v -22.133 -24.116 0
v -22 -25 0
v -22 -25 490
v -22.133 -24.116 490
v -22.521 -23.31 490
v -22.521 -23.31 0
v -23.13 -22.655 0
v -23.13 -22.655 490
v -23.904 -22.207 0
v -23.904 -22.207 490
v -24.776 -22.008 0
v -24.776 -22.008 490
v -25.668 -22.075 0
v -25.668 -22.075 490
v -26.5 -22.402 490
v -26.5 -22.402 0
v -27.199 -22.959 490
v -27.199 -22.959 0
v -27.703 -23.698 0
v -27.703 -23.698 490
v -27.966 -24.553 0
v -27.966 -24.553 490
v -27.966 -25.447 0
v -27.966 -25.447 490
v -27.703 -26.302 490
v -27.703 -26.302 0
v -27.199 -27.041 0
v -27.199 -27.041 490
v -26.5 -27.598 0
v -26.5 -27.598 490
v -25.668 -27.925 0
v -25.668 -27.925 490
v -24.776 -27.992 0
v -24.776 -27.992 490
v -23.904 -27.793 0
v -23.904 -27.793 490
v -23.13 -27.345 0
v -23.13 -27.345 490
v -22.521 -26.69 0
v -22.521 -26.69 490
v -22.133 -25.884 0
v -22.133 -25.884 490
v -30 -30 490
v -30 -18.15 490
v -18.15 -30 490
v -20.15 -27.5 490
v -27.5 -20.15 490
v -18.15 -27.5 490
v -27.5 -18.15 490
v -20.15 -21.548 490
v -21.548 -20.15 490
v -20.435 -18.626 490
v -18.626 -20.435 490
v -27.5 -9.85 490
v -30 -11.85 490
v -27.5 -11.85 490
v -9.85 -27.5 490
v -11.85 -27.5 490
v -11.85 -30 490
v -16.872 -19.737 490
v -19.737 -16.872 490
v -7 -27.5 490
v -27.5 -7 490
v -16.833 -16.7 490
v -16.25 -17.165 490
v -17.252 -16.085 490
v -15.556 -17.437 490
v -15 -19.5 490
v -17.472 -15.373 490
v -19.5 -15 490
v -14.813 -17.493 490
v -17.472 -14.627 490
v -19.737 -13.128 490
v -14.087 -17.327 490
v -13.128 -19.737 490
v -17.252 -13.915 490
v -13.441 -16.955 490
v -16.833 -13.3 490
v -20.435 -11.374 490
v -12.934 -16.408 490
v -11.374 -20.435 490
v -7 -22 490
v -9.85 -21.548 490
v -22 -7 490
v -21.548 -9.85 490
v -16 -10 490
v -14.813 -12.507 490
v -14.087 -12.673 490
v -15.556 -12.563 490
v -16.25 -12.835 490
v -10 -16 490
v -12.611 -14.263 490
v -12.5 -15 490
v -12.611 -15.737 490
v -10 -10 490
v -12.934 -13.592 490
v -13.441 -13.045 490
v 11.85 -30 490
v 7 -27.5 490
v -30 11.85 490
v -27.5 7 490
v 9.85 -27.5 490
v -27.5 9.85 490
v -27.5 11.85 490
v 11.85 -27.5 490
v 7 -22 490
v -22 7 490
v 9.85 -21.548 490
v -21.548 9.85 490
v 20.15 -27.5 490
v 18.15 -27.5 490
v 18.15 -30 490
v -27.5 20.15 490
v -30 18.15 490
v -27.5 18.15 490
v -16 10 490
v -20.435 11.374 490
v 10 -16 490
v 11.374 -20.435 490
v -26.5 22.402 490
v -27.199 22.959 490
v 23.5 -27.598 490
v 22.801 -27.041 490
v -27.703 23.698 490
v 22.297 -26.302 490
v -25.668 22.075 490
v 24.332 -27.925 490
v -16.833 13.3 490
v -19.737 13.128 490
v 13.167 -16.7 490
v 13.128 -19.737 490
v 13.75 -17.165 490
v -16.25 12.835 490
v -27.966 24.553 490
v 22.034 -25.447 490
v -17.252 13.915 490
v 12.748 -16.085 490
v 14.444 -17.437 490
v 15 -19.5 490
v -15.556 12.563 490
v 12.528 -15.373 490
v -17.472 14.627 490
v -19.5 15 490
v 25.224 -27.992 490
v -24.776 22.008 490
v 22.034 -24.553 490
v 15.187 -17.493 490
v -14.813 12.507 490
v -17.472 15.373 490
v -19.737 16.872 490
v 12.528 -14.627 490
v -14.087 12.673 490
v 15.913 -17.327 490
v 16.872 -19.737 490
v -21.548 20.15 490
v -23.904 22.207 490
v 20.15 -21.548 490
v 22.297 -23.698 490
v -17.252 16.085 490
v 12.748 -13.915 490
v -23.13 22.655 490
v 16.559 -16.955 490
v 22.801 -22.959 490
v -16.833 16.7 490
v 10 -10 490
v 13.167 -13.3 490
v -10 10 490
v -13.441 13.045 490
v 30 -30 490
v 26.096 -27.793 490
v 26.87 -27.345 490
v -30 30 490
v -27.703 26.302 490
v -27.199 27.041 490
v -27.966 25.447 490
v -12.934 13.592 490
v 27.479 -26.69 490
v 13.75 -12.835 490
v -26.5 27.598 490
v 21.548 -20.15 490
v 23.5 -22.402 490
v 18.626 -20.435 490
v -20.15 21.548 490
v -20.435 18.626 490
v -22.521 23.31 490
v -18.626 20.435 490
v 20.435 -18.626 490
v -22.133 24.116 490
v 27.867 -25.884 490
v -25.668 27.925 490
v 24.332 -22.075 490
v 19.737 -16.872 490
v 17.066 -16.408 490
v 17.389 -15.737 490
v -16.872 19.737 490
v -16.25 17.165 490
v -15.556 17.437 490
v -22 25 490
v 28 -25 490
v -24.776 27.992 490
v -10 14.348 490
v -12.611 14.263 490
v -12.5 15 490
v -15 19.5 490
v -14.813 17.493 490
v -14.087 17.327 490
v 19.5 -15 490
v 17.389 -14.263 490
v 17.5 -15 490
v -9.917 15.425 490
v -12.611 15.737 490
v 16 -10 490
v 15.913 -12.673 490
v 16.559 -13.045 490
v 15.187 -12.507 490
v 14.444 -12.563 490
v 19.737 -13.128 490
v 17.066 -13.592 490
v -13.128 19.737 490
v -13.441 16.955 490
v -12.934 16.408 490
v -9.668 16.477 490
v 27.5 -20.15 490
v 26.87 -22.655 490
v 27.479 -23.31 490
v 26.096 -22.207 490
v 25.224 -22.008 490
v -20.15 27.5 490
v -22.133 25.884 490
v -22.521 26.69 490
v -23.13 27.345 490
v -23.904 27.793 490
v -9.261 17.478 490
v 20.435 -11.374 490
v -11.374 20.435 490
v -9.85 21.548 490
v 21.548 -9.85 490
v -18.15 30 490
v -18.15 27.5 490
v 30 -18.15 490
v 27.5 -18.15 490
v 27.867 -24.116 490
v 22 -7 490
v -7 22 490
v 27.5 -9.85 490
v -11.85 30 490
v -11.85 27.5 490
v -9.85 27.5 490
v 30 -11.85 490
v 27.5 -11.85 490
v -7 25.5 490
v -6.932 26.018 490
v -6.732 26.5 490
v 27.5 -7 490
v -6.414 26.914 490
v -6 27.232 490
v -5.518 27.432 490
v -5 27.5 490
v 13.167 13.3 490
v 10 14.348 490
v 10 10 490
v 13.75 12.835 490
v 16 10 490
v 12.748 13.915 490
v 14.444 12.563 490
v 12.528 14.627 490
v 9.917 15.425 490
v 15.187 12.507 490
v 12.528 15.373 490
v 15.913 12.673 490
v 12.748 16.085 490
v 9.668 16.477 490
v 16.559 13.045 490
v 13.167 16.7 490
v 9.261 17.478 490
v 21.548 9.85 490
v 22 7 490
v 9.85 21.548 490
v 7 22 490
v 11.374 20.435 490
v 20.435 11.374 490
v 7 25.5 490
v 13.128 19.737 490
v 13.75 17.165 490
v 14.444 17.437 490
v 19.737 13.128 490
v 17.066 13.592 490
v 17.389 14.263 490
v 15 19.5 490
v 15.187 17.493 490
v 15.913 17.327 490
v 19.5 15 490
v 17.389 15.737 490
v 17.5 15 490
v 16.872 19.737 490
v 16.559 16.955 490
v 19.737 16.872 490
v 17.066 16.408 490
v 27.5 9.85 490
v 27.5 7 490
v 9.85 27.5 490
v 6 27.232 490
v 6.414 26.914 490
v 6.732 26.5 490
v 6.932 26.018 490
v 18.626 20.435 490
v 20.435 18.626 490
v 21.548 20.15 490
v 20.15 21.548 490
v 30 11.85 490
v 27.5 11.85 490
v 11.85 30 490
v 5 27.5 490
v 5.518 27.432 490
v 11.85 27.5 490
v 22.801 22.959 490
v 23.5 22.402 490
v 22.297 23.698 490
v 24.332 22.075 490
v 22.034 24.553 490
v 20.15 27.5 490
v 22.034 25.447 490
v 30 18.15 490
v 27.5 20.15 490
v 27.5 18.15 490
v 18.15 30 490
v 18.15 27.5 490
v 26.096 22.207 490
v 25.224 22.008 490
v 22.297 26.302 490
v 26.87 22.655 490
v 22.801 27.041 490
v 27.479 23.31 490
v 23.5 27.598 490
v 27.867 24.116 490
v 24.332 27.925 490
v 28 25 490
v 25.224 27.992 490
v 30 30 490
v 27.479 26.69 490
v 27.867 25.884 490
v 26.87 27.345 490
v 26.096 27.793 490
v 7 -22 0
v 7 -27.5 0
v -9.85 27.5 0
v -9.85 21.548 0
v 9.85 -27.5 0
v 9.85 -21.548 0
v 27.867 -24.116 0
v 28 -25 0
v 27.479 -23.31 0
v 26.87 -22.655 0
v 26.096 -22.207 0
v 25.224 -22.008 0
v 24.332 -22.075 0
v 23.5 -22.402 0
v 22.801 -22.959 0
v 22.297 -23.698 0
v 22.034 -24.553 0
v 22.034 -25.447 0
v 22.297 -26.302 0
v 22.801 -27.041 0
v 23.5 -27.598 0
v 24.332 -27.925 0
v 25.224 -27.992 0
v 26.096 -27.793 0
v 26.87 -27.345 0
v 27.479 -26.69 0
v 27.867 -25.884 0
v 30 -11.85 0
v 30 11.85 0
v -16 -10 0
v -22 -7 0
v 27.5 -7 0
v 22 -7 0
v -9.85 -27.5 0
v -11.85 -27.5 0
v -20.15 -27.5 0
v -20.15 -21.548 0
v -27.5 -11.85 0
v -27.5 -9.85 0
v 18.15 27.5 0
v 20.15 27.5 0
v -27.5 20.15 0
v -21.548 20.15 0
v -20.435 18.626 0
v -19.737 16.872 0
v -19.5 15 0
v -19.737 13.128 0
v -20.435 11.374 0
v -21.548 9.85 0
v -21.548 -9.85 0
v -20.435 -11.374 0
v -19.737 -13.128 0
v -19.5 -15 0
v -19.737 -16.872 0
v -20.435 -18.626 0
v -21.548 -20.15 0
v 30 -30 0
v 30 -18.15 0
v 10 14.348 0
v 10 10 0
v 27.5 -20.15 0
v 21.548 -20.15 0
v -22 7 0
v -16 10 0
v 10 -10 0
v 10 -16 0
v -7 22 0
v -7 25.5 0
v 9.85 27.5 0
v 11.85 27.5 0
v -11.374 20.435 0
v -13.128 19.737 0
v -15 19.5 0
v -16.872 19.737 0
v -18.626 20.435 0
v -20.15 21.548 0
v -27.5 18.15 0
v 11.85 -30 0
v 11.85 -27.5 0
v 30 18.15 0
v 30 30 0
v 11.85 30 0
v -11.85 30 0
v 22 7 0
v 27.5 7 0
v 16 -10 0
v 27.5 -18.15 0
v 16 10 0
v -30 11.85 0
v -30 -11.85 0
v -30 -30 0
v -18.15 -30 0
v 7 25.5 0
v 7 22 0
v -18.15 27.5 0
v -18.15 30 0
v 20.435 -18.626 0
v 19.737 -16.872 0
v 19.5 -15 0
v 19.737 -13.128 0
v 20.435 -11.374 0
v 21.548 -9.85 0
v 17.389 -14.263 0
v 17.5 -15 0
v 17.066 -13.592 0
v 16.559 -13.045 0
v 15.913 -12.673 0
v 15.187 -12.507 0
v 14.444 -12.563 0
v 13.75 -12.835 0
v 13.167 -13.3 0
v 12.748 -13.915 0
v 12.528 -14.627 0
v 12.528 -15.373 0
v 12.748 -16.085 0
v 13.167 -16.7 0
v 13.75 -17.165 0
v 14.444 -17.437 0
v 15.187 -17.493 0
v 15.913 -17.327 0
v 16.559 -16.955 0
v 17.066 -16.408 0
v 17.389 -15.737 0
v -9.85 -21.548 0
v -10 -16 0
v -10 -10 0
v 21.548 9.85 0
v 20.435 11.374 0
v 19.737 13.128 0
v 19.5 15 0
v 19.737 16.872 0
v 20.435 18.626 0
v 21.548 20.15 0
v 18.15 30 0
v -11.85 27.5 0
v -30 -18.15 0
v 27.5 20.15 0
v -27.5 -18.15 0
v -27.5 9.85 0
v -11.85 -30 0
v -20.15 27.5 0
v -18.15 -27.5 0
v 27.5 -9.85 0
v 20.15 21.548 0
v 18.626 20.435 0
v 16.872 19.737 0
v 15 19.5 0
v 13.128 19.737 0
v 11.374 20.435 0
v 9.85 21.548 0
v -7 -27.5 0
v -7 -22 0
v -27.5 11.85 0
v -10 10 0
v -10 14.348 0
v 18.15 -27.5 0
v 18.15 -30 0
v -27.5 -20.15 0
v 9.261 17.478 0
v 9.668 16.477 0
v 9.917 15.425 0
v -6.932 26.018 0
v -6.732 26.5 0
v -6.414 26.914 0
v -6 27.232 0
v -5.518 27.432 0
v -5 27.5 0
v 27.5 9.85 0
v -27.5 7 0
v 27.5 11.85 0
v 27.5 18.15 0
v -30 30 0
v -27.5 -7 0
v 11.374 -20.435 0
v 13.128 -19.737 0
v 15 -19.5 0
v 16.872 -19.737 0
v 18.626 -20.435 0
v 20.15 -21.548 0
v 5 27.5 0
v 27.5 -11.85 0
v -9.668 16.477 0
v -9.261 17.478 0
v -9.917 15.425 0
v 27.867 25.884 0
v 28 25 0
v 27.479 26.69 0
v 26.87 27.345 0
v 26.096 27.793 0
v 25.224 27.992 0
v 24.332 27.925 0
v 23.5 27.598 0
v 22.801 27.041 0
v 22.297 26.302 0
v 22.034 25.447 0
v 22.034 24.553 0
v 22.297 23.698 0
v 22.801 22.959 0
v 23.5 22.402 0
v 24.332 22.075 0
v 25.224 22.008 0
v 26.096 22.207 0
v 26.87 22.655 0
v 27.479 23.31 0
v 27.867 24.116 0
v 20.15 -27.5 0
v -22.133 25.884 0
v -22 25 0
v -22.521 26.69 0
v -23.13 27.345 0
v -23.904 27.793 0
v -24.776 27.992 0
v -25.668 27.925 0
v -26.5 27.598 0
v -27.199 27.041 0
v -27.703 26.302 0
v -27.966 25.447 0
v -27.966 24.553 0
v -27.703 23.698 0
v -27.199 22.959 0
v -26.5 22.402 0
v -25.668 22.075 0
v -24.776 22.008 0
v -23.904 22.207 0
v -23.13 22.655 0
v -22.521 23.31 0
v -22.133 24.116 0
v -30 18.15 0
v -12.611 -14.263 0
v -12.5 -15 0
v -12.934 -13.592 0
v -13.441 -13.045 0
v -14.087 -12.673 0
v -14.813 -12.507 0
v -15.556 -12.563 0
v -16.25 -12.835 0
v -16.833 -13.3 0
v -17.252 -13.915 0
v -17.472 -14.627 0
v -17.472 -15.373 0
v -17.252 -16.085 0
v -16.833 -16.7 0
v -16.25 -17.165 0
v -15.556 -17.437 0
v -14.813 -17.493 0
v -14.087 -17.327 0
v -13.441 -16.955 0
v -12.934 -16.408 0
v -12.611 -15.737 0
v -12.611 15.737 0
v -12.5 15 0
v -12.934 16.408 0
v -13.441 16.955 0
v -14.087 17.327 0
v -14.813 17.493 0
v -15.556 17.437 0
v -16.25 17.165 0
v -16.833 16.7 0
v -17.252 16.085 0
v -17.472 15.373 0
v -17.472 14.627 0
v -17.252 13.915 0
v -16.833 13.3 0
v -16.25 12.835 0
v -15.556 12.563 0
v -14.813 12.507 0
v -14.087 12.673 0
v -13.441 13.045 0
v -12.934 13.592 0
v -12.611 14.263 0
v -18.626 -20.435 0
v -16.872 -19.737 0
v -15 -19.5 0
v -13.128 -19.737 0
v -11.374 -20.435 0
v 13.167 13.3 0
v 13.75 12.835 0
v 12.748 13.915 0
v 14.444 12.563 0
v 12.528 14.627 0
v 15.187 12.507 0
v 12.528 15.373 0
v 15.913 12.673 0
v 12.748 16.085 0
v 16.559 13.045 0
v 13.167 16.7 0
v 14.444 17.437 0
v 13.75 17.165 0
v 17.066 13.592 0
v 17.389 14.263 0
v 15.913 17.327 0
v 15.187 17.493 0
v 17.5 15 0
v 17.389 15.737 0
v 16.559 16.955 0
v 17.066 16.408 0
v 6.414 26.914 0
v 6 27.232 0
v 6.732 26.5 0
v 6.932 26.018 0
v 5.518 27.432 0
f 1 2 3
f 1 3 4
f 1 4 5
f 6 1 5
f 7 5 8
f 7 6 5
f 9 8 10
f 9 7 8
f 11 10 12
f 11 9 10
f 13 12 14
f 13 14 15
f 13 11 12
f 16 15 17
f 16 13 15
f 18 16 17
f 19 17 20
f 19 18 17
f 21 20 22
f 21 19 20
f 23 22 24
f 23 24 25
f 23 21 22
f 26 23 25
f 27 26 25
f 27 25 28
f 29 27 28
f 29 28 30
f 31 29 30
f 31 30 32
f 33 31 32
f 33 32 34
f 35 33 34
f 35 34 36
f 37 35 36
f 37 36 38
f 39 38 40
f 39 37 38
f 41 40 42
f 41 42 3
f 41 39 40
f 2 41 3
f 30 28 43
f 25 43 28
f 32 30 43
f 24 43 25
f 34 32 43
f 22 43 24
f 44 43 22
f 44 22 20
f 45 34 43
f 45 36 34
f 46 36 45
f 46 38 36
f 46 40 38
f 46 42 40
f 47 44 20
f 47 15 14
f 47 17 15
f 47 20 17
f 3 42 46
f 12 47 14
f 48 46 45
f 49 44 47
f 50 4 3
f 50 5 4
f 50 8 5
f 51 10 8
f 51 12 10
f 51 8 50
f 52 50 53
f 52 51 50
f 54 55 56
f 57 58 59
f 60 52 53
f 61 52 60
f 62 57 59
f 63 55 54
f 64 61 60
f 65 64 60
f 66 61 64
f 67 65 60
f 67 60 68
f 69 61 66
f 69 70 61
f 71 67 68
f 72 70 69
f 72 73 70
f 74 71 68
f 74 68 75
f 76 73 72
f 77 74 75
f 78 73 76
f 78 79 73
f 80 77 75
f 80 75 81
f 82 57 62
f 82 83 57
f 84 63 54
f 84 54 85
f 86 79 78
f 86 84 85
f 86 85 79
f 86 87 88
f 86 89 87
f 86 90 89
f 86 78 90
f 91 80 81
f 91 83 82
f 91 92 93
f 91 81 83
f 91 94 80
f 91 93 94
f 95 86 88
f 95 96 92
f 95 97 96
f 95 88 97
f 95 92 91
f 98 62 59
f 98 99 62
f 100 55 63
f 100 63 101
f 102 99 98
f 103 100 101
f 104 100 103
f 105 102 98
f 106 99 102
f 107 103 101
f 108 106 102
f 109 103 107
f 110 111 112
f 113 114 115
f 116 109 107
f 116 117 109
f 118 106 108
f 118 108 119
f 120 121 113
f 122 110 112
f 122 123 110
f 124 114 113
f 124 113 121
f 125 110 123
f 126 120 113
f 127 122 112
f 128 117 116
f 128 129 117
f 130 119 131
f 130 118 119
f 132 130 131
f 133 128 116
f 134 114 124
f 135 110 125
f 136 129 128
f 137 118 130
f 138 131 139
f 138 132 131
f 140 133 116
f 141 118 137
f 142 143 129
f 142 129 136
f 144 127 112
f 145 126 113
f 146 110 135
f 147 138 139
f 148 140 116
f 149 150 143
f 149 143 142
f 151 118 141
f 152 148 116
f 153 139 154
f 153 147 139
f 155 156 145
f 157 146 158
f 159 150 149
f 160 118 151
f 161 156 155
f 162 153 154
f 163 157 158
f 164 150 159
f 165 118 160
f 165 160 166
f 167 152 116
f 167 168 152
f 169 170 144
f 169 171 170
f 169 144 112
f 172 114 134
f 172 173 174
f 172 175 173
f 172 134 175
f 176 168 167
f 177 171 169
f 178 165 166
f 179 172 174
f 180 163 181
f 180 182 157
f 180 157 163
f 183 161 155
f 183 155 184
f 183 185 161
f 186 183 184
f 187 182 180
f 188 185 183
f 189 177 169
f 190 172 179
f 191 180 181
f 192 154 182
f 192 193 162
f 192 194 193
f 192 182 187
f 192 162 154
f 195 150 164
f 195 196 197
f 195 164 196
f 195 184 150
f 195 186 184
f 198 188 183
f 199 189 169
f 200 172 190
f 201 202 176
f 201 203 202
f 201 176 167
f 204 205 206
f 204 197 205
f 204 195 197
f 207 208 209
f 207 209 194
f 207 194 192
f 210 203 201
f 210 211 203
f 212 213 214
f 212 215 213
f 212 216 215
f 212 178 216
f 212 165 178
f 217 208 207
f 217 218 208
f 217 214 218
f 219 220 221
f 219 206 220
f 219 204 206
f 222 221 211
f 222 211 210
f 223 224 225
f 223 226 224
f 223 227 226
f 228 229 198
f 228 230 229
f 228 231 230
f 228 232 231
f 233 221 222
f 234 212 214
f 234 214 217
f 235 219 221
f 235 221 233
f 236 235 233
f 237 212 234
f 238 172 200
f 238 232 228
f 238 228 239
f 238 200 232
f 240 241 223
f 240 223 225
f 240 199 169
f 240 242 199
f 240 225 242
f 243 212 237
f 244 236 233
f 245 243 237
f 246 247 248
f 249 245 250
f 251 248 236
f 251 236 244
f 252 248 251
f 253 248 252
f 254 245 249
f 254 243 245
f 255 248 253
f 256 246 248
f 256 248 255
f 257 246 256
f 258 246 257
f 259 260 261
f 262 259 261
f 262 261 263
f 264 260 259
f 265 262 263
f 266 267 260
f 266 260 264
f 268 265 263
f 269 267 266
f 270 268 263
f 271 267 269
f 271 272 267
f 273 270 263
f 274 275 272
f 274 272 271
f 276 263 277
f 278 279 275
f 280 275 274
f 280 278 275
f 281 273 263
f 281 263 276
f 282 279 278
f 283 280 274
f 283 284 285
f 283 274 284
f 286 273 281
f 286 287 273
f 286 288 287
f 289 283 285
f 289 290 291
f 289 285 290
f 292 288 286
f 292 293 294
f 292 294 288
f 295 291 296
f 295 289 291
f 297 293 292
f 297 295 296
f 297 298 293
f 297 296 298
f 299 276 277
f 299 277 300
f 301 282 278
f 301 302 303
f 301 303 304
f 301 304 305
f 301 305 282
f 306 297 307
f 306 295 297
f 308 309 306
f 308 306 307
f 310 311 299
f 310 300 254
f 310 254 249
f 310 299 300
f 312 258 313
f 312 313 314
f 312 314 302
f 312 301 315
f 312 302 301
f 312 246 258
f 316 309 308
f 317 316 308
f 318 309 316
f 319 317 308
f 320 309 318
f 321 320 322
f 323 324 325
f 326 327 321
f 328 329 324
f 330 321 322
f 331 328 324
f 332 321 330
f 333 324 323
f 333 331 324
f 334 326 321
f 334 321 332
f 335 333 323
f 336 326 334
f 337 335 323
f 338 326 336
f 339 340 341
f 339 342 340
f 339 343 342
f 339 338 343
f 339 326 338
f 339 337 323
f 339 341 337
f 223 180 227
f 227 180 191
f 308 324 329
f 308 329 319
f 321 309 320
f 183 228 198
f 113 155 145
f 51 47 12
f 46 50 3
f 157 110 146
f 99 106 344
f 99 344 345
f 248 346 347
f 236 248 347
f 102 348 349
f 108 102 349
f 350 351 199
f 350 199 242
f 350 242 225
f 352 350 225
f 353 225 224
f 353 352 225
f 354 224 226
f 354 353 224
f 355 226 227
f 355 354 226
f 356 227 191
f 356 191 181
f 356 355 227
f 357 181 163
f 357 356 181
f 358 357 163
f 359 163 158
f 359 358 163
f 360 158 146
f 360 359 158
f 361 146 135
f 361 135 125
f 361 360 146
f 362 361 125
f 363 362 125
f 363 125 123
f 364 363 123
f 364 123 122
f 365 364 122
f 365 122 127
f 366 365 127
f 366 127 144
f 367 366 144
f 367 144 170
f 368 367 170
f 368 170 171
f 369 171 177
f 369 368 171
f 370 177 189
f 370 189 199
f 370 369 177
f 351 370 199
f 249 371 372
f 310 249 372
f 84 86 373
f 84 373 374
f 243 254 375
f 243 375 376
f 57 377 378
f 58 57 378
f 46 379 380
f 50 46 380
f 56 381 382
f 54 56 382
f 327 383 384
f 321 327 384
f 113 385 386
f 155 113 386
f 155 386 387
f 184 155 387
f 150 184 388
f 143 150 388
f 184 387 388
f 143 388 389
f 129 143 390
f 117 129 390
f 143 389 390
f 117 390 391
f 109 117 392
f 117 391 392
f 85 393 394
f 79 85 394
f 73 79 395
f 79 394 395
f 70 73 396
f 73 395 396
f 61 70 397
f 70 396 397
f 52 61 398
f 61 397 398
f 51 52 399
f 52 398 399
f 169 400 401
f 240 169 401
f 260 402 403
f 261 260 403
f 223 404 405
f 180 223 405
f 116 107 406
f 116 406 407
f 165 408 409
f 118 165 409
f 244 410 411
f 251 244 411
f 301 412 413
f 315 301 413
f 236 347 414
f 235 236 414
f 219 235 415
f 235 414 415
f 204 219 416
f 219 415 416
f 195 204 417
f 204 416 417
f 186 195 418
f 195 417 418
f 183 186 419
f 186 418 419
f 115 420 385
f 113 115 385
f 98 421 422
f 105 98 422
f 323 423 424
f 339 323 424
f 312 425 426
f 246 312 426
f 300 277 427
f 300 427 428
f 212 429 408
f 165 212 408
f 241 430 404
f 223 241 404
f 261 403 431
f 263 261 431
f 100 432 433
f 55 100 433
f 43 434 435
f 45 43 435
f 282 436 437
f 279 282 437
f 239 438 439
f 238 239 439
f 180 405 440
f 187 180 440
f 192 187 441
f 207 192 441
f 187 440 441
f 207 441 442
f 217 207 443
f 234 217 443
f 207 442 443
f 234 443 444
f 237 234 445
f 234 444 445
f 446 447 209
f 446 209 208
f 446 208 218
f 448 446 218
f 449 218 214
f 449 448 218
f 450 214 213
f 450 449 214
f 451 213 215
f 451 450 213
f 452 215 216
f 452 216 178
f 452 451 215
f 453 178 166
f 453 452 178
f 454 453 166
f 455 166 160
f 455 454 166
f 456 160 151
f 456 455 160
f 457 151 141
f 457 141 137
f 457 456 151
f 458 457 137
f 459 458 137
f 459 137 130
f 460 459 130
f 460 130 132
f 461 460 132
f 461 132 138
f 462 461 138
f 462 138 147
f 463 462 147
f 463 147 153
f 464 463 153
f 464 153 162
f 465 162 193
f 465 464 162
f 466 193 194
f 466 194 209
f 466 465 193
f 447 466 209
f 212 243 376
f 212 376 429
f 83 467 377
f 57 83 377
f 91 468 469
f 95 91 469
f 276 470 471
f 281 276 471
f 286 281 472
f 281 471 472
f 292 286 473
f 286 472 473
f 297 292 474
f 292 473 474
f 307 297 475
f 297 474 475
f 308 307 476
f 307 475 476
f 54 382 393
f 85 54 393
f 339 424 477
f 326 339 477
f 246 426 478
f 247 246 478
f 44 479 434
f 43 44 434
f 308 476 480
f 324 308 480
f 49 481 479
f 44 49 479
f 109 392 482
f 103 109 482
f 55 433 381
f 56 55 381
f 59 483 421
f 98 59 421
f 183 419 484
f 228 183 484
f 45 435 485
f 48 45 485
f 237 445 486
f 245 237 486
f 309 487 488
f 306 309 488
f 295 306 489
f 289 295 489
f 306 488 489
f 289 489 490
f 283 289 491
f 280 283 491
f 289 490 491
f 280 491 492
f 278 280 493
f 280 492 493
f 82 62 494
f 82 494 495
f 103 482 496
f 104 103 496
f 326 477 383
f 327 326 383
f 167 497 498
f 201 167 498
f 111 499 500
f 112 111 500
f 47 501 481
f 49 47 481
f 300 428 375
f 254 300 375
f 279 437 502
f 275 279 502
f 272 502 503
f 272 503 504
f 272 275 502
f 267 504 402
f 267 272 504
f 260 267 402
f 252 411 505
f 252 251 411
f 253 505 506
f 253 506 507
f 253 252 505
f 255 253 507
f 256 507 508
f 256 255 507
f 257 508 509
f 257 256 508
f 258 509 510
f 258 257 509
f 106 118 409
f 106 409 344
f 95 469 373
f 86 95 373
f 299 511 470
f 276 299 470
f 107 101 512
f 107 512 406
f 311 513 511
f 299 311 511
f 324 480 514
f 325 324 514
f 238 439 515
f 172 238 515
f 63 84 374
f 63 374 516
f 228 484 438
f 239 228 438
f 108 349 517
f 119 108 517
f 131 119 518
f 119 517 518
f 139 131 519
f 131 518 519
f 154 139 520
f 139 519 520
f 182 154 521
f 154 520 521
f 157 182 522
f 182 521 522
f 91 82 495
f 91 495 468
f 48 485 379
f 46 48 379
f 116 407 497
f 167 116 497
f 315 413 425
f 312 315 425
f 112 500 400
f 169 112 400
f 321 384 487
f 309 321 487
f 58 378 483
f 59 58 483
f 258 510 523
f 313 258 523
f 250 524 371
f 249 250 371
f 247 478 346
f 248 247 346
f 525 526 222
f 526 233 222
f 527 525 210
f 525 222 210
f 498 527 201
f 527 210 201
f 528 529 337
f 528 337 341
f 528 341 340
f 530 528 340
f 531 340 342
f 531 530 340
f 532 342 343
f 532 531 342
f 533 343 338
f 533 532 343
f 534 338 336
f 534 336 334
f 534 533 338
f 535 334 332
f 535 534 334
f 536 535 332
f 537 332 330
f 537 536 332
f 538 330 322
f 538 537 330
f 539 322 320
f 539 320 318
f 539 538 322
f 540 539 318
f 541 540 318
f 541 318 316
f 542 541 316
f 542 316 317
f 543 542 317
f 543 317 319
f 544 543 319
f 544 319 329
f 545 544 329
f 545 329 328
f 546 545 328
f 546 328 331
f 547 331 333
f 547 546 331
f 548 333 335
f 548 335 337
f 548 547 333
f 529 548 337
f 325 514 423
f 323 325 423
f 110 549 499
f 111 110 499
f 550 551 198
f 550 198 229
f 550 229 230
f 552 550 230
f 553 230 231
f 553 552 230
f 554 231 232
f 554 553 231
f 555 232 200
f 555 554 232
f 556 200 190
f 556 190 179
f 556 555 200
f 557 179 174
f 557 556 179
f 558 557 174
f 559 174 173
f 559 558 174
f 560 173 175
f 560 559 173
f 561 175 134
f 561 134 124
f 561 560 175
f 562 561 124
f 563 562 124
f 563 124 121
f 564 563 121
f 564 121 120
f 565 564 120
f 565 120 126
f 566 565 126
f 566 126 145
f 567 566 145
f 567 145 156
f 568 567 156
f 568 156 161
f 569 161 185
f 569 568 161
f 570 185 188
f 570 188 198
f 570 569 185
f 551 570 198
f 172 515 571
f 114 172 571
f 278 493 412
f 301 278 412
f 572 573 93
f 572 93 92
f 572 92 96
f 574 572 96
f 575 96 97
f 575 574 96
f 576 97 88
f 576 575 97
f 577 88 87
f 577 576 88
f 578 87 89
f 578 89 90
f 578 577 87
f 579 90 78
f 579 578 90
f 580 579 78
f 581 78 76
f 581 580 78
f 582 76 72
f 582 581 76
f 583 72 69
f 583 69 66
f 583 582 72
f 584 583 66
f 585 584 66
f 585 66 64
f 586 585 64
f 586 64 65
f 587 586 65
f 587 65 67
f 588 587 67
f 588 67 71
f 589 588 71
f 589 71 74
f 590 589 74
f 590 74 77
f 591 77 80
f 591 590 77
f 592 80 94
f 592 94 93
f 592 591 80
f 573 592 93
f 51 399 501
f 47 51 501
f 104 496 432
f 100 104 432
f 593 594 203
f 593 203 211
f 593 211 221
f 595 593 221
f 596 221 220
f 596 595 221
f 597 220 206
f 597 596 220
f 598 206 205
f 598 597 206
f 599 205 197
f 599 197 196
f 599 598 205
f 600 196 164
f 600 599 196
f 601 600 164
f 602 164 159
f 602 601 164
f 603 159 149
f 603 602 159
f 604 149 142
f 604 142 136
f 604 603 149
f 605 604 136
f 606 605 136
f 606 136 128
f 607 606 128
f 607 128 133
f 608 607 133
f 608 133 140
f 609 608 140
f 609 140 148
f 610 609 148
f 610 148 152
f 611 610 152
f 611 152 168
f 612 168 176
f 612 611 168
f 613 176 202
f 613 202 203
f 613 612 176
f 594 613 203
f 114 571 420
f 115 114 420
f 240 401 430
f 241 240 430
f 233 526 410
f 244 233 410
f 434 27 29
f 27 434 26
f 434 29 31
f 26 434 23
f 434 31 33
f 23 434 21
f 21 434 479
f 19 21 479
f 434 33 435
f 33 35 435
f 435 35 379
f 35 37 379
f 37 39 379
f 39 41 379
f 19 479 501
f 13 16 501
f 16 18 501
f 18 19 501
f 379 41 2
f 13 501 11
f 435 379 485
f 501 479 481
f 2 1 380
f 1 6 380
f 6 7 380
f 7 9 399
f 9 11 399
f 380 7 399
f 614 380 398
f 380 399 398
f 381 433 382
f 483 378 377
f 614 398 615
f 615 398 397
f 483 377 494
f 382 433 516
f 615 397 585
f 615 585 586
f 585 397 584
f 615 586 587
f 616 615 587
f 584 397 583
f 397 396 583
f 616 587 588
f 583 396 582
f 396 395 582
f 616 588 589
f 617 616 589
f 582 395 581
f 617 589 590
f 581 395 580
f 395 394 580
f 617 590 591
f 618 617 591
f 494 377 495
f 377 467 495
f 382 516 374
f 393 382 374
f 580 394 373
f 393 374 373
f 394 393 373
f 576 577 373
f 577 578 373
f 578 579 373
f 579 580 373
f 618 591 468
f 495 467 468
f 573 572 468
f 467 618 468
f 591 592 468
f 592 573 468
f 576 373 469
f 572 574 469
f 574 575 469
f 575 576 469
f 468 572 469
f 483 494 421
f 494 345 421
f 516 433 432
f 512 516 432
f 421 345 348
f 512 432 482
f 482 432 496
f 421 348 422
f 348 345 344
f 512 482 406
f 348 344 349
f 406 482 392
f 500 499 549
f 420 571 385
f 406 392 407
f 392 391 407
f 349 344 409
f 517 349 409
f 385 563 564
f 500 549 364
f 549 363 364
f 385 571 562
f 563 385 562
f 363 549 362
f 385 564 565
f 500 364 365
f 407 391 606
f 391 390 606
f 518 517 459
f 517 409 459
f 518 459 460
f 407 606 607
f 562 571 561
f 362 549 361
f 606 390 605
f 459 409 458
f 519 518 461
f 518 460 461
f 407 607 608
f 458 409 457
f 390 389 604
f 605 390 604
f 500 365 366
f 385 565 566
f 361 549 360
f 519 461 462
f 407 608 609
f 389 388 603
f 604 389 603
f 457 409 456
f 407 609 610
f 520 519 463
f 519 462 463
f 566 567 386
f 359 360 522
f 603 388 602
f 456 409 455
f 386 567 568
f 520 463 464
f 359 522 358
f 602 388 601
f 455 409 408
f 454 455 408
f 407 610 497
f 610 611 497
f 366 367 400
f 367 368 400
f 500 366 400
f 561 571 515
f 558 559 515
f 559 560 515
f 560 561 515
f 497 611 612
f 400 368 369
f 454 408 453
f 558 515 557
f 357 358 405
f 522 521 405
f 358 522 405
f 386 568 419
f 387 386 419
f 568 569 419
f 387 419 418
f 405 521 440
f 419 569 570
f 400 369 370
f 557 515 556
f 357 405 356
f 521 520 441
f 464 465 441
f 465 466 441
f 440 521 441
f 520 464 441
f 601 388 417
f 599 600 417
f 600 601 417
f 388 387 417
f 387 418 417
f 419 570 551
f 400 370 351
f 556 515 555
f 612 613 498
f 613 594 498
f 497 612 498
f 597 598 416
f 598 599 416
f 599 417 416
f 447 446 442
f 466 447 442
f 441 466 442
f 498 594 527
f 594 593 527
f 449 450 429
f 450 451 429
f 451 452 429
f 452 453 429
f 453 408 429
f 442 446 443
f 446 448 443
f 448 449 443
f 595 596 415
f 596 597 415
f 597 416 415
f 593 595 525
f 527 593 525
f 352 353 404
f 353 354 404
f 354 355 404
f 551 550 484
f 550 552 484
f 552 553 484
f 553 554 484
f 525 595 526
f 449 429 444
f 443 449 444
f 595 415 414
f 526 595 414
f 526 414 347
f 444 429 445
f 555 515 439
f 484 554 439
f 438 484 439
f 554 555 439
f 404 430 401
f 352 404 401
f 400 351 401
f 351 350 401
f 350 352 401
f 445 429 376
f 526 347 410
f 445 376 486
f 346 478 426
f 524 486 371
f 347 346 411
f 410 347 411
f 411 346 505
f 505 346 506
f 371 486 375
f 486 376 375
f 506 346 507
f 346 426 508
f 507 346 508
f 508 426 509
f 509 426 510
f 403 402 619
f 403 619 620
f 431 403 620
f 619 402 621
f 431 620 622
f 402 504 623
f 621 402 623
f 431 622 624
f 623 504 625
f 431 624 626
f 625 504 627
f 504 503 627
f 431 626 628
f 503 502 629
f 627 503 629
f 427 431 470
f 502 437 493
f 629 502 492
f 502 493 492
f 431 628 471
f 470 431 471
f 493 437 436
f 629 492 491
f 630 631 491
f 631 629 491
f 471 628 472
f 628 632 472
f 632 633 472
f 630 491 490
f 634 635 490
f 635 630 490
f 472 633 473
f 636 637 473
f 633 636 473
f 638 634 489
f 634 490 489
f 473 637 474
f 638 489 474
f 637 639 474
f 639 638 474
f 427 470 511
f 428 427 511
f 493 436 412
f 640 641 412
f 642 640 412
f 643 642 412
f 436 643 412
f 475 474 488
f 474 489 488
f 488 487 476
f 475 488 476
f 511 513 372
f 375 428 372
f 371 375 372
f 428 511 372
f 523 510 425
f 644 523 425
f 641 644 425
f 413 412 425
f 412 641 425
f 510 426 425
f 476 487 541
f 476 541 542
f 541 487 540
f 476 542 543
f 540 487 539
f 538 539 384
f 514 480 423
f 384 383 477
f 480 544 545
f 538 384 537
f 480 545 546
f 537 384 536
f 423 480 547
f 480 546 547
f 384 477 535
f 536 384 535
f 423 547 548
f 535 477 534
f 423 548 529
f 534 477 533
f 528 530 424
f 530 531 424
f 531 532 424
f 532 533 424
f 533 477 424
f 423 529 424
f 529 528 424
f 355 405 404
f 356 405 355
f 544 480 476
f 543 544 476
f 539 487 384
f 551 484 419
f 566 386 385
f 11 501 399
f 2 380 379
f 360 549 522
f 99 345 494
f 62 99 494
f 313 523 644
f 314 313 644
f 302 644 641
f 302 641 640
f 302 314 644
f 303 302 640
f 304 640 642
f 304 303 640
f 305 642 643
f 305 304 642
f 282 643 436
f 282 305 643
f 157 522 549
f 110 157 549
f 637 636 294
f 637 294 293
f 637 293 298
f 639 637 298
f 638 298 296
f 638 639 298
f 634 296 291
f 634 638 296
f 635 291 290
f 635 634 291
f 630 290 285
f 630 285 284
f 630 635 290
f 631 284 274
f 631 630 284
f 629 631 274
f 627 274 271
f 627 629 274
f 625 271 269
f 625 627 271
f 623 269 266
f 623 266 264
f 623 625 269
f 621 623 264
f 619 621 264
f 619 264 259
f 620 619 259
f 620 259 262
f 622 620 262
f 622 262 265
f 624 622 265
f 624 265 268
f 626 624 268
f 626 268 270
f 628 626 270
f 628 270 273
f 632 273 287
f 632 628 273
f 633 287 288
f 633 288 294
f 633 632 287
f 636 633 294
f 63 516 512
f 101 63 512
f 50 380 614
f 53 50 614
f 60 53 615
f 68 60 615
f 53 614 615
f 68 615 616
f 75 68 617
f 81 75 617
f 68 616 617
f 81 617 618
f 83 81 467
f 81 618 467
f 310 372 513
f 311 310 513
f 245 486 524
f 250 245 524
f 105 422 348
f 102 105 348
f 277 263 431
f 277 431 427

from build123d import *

# Parameters (mm, degrees)
F0_R     = 3
F0_R_2   = 2.5
F1_DEPTH = 490
F2_R     = 2
F3_R     = 7


# Not quite as in the source:
# - a feature names something its author has since deleted; it is built from what else it names


with BuildPart() as f1:
    # F0 (on Top) → F1 (new body)
    with BuildSketch(Plane.XY):
        with BuildLine():
            Line((18.15, -30), (30, -30))
            Line((30, -30), (30, -18.15))
            Line((30, -18.15), (27.5, -18.15))
            Line((27.5, -18.15), (27.5, -20.15))
            Line((27.5, -20.15), (21.5477069044, -20.15))
            ThreePointArc((21.5477069044, -20.15), (19.5, -15), (21.5477069044, -9.85))
            Line((21.5477069044, -9.85), (27.5, -9.85))
            Line((27.5, -9.85), (27.5, -11.85))
            Line((27.5, -11.85), (30, -11.85))
            Line((30, -11.85), (30, 11.85))
            Line((30, 11.85), (27.5, 11.85))
            Line((27.5, 11.85), (27.5, 9.85))
            Line((27.5, 9.85), (21.5477069044, 9.85))
            ThreePointArc((21.5477069044, 9.85), (19.5, 15), (21.5477069044, 20.15))
            Line((21.5477069044, 20.15), (27.5, 20.15))
            Line((27.5, 20.15), (27.5, 18.15))
            Line((27.5, 18.15), (30, 18.15))
            Line((30, 18.15), (30, 30))
            Line((30, 30), (18.15, 30))
            Line((18.15, 30), (18.15, 27.5))
            Line((18.15, 27.5), (20.15, 27.5))
            Line((20.15, 27.5), (20.15, 21.5477069044))
            ThreePointArc((20.15, 21.5477069044), (15, 19.5), (9.85, 21.5477069044))
            Line((9.85, 21.5477069044), (9.85, 27.5))
            Line((9.85, 27.5), (11.85, 27.5))
            Line((11.85, 27.5), (11.85, 30))
            Line((11.85, 30), (-11.85, 30))
            Line((-11.85, 30), (-11.85, 27.5))
            Line((-11.85, 27.5), (-9.85, 27.5))
            Line((-9.85, 27.5), (-9.85, 21.5477069044))
            ThreePointArc((-9.85, 21.5477069044), (-15, 19.5), (-20.15, 21.5477069044))
            Line((-20.15, 21.5477069044), (-20.15, 27.5))
            Line((-20.15, 27.5), (-18.15, 27.5))
            Line((-18.15, 27.5), (-18.15, 30))
            Line((-18.15, 30), (-30, 30))
            Line((-30, 30), (-30, 18.15))
            Line((-30, 18.15), (-27.5, 18.15))
            Line((-27.5, 18.15), (-27.5, 20.15))
            Line((-27.5, 20.15), (-21.5477069044, 20.15))
            ThreePointArc((-21.5477069044, 20.15), (-19.5, 15), (-21.5477069044, 9.85))
            Line((-21.5477069044, 9.85), (-27.5, 9.85))
            Line((-27.5, 9.85), (-27.5, 11.85))
            Line((-27.5, 11.85), (-30, 11.85))
            Line((-30, 11.85), (-30, -11.85))
            Line((-30, -11.85), (-27.5, -11.85))
            Line((-27.5, -11.85), (-27.5, -9.85))
            Line((-27.5, -9.85), (-21.5477069044, -9.85))
            ThreePointArc((-21.5477069044, -9.85), (-19.5, -15), (-21.5477069044, -20.15))
            Line((-21.5477069044, -20.15), (-27.5, -20.15))
            Line((-27.5, -20.15), (-27.5, -18.15))
            Line((-27.5, -18.15), (-30, -18.15))
            Line((-30, -18.15), (-30, -30))
            Line((-30, -30), (-18.15, -30))
            Line((-18.15, -30), (-18.15, -27.5))
            Line((-18.15, -27.5), (-20.15, -27.5))
            Line((-20.15, -27.5), (-20.15, -21.5477069044))
            ThreePointArc((-20.15, -21.5477069044), (-15, -19.5), (-9.85, -21.5477069044))
            Line((-9.85, -21.5477069044), (-9.85, -27.5))
            Line((-9.85, -27.5), (-11.85, -27.5))
            Line((-11.85, -27.5), (-11.85, -30))
            Line((-11.85, -30), (11.85, -30))
            Line((11.85, -30), (11.85, -27.5))
            Line((11.85, -27.5), (9.85, -27.5))
            Line((9.85, -27.5), (9.85, -21.5477069044))
            ThreePointArc((9.85, -21.5477069044), (15, -19.5), (20.15, -21.5477069044))
            Line((20.15, -21.5477069044), (20.15, -27.5))
            Line((20.15, -27.5), (18.15, -27.5))
            Line((18.15, -27.5), (18.15, -30))
        make_face()
        with Locations((-25, -25)):
            Circle(F0_R, mode=Mode.SUBTRACT)
        with Locations((-15, -15)):
            Circle(F0_R_2, mode=Mode.SUBTRACT)
        with Locations((25, -25)):
            Circle(F0_R, mode=Mode.SUBTRACT)
        with Locations((15, -15)):
            Circle(F0_R_2, mode=Mode.SUBTRACT)
        with Locations((-25, 25)):
            Circle(F0_R, mode=Mode.SUBTRACT)
        with Locations((-15, 15)):
            Circle(F0_R_2, mode=Mode.SUBTRACT)
        Polygon((-7, 22), (-7, 27.5), (0, 27.5), (7, 27.5), (7, 22), (10, 16), (10, 10), (16, 10), (22, 7), (27.5, 7), (27.5, 0), (27.5, -7), (22, -7), (16, -10), (10, -10), (10, -16), (7, -22), (7, -27.5), (0, -27.5), (-7, -27.5), (-7, -22), (-10, -16), (-10, -10), (-16, -10), (-22, -7), (-27.5, -7), (-27.5, 0), (-27.5, 7), (-22, 7), (-16, 10), (-10, 10), (-10, 16), align=None, mode=Mode.SUBTRACT)
        with Locations((15, 15)):
            Circle(F0_R_2, mode=Mode.SUBTRACT)
        with Locations((25, 25)):
            Circle(F0_R, mode=Mode.SUBTRACT)
    extrude(amount=F1_DEPTH)

    # F2
    f2_edges = [f1.edges().sort_by_distance(p)[0] for p in [
        (-7, 27.5, 245),
        (7, 27.5, 245),
    ]]
    fillet(f2_edges, radius=F2_R)

    # F3
    f3_edges = [f1.edges().sort_by_distance(p)[0] for p in [
        (-10, 16, 245),
        (10, 16, 245),
    ]]
    fillet(f3_edges, radius=F3_R)


solid = f1.part
